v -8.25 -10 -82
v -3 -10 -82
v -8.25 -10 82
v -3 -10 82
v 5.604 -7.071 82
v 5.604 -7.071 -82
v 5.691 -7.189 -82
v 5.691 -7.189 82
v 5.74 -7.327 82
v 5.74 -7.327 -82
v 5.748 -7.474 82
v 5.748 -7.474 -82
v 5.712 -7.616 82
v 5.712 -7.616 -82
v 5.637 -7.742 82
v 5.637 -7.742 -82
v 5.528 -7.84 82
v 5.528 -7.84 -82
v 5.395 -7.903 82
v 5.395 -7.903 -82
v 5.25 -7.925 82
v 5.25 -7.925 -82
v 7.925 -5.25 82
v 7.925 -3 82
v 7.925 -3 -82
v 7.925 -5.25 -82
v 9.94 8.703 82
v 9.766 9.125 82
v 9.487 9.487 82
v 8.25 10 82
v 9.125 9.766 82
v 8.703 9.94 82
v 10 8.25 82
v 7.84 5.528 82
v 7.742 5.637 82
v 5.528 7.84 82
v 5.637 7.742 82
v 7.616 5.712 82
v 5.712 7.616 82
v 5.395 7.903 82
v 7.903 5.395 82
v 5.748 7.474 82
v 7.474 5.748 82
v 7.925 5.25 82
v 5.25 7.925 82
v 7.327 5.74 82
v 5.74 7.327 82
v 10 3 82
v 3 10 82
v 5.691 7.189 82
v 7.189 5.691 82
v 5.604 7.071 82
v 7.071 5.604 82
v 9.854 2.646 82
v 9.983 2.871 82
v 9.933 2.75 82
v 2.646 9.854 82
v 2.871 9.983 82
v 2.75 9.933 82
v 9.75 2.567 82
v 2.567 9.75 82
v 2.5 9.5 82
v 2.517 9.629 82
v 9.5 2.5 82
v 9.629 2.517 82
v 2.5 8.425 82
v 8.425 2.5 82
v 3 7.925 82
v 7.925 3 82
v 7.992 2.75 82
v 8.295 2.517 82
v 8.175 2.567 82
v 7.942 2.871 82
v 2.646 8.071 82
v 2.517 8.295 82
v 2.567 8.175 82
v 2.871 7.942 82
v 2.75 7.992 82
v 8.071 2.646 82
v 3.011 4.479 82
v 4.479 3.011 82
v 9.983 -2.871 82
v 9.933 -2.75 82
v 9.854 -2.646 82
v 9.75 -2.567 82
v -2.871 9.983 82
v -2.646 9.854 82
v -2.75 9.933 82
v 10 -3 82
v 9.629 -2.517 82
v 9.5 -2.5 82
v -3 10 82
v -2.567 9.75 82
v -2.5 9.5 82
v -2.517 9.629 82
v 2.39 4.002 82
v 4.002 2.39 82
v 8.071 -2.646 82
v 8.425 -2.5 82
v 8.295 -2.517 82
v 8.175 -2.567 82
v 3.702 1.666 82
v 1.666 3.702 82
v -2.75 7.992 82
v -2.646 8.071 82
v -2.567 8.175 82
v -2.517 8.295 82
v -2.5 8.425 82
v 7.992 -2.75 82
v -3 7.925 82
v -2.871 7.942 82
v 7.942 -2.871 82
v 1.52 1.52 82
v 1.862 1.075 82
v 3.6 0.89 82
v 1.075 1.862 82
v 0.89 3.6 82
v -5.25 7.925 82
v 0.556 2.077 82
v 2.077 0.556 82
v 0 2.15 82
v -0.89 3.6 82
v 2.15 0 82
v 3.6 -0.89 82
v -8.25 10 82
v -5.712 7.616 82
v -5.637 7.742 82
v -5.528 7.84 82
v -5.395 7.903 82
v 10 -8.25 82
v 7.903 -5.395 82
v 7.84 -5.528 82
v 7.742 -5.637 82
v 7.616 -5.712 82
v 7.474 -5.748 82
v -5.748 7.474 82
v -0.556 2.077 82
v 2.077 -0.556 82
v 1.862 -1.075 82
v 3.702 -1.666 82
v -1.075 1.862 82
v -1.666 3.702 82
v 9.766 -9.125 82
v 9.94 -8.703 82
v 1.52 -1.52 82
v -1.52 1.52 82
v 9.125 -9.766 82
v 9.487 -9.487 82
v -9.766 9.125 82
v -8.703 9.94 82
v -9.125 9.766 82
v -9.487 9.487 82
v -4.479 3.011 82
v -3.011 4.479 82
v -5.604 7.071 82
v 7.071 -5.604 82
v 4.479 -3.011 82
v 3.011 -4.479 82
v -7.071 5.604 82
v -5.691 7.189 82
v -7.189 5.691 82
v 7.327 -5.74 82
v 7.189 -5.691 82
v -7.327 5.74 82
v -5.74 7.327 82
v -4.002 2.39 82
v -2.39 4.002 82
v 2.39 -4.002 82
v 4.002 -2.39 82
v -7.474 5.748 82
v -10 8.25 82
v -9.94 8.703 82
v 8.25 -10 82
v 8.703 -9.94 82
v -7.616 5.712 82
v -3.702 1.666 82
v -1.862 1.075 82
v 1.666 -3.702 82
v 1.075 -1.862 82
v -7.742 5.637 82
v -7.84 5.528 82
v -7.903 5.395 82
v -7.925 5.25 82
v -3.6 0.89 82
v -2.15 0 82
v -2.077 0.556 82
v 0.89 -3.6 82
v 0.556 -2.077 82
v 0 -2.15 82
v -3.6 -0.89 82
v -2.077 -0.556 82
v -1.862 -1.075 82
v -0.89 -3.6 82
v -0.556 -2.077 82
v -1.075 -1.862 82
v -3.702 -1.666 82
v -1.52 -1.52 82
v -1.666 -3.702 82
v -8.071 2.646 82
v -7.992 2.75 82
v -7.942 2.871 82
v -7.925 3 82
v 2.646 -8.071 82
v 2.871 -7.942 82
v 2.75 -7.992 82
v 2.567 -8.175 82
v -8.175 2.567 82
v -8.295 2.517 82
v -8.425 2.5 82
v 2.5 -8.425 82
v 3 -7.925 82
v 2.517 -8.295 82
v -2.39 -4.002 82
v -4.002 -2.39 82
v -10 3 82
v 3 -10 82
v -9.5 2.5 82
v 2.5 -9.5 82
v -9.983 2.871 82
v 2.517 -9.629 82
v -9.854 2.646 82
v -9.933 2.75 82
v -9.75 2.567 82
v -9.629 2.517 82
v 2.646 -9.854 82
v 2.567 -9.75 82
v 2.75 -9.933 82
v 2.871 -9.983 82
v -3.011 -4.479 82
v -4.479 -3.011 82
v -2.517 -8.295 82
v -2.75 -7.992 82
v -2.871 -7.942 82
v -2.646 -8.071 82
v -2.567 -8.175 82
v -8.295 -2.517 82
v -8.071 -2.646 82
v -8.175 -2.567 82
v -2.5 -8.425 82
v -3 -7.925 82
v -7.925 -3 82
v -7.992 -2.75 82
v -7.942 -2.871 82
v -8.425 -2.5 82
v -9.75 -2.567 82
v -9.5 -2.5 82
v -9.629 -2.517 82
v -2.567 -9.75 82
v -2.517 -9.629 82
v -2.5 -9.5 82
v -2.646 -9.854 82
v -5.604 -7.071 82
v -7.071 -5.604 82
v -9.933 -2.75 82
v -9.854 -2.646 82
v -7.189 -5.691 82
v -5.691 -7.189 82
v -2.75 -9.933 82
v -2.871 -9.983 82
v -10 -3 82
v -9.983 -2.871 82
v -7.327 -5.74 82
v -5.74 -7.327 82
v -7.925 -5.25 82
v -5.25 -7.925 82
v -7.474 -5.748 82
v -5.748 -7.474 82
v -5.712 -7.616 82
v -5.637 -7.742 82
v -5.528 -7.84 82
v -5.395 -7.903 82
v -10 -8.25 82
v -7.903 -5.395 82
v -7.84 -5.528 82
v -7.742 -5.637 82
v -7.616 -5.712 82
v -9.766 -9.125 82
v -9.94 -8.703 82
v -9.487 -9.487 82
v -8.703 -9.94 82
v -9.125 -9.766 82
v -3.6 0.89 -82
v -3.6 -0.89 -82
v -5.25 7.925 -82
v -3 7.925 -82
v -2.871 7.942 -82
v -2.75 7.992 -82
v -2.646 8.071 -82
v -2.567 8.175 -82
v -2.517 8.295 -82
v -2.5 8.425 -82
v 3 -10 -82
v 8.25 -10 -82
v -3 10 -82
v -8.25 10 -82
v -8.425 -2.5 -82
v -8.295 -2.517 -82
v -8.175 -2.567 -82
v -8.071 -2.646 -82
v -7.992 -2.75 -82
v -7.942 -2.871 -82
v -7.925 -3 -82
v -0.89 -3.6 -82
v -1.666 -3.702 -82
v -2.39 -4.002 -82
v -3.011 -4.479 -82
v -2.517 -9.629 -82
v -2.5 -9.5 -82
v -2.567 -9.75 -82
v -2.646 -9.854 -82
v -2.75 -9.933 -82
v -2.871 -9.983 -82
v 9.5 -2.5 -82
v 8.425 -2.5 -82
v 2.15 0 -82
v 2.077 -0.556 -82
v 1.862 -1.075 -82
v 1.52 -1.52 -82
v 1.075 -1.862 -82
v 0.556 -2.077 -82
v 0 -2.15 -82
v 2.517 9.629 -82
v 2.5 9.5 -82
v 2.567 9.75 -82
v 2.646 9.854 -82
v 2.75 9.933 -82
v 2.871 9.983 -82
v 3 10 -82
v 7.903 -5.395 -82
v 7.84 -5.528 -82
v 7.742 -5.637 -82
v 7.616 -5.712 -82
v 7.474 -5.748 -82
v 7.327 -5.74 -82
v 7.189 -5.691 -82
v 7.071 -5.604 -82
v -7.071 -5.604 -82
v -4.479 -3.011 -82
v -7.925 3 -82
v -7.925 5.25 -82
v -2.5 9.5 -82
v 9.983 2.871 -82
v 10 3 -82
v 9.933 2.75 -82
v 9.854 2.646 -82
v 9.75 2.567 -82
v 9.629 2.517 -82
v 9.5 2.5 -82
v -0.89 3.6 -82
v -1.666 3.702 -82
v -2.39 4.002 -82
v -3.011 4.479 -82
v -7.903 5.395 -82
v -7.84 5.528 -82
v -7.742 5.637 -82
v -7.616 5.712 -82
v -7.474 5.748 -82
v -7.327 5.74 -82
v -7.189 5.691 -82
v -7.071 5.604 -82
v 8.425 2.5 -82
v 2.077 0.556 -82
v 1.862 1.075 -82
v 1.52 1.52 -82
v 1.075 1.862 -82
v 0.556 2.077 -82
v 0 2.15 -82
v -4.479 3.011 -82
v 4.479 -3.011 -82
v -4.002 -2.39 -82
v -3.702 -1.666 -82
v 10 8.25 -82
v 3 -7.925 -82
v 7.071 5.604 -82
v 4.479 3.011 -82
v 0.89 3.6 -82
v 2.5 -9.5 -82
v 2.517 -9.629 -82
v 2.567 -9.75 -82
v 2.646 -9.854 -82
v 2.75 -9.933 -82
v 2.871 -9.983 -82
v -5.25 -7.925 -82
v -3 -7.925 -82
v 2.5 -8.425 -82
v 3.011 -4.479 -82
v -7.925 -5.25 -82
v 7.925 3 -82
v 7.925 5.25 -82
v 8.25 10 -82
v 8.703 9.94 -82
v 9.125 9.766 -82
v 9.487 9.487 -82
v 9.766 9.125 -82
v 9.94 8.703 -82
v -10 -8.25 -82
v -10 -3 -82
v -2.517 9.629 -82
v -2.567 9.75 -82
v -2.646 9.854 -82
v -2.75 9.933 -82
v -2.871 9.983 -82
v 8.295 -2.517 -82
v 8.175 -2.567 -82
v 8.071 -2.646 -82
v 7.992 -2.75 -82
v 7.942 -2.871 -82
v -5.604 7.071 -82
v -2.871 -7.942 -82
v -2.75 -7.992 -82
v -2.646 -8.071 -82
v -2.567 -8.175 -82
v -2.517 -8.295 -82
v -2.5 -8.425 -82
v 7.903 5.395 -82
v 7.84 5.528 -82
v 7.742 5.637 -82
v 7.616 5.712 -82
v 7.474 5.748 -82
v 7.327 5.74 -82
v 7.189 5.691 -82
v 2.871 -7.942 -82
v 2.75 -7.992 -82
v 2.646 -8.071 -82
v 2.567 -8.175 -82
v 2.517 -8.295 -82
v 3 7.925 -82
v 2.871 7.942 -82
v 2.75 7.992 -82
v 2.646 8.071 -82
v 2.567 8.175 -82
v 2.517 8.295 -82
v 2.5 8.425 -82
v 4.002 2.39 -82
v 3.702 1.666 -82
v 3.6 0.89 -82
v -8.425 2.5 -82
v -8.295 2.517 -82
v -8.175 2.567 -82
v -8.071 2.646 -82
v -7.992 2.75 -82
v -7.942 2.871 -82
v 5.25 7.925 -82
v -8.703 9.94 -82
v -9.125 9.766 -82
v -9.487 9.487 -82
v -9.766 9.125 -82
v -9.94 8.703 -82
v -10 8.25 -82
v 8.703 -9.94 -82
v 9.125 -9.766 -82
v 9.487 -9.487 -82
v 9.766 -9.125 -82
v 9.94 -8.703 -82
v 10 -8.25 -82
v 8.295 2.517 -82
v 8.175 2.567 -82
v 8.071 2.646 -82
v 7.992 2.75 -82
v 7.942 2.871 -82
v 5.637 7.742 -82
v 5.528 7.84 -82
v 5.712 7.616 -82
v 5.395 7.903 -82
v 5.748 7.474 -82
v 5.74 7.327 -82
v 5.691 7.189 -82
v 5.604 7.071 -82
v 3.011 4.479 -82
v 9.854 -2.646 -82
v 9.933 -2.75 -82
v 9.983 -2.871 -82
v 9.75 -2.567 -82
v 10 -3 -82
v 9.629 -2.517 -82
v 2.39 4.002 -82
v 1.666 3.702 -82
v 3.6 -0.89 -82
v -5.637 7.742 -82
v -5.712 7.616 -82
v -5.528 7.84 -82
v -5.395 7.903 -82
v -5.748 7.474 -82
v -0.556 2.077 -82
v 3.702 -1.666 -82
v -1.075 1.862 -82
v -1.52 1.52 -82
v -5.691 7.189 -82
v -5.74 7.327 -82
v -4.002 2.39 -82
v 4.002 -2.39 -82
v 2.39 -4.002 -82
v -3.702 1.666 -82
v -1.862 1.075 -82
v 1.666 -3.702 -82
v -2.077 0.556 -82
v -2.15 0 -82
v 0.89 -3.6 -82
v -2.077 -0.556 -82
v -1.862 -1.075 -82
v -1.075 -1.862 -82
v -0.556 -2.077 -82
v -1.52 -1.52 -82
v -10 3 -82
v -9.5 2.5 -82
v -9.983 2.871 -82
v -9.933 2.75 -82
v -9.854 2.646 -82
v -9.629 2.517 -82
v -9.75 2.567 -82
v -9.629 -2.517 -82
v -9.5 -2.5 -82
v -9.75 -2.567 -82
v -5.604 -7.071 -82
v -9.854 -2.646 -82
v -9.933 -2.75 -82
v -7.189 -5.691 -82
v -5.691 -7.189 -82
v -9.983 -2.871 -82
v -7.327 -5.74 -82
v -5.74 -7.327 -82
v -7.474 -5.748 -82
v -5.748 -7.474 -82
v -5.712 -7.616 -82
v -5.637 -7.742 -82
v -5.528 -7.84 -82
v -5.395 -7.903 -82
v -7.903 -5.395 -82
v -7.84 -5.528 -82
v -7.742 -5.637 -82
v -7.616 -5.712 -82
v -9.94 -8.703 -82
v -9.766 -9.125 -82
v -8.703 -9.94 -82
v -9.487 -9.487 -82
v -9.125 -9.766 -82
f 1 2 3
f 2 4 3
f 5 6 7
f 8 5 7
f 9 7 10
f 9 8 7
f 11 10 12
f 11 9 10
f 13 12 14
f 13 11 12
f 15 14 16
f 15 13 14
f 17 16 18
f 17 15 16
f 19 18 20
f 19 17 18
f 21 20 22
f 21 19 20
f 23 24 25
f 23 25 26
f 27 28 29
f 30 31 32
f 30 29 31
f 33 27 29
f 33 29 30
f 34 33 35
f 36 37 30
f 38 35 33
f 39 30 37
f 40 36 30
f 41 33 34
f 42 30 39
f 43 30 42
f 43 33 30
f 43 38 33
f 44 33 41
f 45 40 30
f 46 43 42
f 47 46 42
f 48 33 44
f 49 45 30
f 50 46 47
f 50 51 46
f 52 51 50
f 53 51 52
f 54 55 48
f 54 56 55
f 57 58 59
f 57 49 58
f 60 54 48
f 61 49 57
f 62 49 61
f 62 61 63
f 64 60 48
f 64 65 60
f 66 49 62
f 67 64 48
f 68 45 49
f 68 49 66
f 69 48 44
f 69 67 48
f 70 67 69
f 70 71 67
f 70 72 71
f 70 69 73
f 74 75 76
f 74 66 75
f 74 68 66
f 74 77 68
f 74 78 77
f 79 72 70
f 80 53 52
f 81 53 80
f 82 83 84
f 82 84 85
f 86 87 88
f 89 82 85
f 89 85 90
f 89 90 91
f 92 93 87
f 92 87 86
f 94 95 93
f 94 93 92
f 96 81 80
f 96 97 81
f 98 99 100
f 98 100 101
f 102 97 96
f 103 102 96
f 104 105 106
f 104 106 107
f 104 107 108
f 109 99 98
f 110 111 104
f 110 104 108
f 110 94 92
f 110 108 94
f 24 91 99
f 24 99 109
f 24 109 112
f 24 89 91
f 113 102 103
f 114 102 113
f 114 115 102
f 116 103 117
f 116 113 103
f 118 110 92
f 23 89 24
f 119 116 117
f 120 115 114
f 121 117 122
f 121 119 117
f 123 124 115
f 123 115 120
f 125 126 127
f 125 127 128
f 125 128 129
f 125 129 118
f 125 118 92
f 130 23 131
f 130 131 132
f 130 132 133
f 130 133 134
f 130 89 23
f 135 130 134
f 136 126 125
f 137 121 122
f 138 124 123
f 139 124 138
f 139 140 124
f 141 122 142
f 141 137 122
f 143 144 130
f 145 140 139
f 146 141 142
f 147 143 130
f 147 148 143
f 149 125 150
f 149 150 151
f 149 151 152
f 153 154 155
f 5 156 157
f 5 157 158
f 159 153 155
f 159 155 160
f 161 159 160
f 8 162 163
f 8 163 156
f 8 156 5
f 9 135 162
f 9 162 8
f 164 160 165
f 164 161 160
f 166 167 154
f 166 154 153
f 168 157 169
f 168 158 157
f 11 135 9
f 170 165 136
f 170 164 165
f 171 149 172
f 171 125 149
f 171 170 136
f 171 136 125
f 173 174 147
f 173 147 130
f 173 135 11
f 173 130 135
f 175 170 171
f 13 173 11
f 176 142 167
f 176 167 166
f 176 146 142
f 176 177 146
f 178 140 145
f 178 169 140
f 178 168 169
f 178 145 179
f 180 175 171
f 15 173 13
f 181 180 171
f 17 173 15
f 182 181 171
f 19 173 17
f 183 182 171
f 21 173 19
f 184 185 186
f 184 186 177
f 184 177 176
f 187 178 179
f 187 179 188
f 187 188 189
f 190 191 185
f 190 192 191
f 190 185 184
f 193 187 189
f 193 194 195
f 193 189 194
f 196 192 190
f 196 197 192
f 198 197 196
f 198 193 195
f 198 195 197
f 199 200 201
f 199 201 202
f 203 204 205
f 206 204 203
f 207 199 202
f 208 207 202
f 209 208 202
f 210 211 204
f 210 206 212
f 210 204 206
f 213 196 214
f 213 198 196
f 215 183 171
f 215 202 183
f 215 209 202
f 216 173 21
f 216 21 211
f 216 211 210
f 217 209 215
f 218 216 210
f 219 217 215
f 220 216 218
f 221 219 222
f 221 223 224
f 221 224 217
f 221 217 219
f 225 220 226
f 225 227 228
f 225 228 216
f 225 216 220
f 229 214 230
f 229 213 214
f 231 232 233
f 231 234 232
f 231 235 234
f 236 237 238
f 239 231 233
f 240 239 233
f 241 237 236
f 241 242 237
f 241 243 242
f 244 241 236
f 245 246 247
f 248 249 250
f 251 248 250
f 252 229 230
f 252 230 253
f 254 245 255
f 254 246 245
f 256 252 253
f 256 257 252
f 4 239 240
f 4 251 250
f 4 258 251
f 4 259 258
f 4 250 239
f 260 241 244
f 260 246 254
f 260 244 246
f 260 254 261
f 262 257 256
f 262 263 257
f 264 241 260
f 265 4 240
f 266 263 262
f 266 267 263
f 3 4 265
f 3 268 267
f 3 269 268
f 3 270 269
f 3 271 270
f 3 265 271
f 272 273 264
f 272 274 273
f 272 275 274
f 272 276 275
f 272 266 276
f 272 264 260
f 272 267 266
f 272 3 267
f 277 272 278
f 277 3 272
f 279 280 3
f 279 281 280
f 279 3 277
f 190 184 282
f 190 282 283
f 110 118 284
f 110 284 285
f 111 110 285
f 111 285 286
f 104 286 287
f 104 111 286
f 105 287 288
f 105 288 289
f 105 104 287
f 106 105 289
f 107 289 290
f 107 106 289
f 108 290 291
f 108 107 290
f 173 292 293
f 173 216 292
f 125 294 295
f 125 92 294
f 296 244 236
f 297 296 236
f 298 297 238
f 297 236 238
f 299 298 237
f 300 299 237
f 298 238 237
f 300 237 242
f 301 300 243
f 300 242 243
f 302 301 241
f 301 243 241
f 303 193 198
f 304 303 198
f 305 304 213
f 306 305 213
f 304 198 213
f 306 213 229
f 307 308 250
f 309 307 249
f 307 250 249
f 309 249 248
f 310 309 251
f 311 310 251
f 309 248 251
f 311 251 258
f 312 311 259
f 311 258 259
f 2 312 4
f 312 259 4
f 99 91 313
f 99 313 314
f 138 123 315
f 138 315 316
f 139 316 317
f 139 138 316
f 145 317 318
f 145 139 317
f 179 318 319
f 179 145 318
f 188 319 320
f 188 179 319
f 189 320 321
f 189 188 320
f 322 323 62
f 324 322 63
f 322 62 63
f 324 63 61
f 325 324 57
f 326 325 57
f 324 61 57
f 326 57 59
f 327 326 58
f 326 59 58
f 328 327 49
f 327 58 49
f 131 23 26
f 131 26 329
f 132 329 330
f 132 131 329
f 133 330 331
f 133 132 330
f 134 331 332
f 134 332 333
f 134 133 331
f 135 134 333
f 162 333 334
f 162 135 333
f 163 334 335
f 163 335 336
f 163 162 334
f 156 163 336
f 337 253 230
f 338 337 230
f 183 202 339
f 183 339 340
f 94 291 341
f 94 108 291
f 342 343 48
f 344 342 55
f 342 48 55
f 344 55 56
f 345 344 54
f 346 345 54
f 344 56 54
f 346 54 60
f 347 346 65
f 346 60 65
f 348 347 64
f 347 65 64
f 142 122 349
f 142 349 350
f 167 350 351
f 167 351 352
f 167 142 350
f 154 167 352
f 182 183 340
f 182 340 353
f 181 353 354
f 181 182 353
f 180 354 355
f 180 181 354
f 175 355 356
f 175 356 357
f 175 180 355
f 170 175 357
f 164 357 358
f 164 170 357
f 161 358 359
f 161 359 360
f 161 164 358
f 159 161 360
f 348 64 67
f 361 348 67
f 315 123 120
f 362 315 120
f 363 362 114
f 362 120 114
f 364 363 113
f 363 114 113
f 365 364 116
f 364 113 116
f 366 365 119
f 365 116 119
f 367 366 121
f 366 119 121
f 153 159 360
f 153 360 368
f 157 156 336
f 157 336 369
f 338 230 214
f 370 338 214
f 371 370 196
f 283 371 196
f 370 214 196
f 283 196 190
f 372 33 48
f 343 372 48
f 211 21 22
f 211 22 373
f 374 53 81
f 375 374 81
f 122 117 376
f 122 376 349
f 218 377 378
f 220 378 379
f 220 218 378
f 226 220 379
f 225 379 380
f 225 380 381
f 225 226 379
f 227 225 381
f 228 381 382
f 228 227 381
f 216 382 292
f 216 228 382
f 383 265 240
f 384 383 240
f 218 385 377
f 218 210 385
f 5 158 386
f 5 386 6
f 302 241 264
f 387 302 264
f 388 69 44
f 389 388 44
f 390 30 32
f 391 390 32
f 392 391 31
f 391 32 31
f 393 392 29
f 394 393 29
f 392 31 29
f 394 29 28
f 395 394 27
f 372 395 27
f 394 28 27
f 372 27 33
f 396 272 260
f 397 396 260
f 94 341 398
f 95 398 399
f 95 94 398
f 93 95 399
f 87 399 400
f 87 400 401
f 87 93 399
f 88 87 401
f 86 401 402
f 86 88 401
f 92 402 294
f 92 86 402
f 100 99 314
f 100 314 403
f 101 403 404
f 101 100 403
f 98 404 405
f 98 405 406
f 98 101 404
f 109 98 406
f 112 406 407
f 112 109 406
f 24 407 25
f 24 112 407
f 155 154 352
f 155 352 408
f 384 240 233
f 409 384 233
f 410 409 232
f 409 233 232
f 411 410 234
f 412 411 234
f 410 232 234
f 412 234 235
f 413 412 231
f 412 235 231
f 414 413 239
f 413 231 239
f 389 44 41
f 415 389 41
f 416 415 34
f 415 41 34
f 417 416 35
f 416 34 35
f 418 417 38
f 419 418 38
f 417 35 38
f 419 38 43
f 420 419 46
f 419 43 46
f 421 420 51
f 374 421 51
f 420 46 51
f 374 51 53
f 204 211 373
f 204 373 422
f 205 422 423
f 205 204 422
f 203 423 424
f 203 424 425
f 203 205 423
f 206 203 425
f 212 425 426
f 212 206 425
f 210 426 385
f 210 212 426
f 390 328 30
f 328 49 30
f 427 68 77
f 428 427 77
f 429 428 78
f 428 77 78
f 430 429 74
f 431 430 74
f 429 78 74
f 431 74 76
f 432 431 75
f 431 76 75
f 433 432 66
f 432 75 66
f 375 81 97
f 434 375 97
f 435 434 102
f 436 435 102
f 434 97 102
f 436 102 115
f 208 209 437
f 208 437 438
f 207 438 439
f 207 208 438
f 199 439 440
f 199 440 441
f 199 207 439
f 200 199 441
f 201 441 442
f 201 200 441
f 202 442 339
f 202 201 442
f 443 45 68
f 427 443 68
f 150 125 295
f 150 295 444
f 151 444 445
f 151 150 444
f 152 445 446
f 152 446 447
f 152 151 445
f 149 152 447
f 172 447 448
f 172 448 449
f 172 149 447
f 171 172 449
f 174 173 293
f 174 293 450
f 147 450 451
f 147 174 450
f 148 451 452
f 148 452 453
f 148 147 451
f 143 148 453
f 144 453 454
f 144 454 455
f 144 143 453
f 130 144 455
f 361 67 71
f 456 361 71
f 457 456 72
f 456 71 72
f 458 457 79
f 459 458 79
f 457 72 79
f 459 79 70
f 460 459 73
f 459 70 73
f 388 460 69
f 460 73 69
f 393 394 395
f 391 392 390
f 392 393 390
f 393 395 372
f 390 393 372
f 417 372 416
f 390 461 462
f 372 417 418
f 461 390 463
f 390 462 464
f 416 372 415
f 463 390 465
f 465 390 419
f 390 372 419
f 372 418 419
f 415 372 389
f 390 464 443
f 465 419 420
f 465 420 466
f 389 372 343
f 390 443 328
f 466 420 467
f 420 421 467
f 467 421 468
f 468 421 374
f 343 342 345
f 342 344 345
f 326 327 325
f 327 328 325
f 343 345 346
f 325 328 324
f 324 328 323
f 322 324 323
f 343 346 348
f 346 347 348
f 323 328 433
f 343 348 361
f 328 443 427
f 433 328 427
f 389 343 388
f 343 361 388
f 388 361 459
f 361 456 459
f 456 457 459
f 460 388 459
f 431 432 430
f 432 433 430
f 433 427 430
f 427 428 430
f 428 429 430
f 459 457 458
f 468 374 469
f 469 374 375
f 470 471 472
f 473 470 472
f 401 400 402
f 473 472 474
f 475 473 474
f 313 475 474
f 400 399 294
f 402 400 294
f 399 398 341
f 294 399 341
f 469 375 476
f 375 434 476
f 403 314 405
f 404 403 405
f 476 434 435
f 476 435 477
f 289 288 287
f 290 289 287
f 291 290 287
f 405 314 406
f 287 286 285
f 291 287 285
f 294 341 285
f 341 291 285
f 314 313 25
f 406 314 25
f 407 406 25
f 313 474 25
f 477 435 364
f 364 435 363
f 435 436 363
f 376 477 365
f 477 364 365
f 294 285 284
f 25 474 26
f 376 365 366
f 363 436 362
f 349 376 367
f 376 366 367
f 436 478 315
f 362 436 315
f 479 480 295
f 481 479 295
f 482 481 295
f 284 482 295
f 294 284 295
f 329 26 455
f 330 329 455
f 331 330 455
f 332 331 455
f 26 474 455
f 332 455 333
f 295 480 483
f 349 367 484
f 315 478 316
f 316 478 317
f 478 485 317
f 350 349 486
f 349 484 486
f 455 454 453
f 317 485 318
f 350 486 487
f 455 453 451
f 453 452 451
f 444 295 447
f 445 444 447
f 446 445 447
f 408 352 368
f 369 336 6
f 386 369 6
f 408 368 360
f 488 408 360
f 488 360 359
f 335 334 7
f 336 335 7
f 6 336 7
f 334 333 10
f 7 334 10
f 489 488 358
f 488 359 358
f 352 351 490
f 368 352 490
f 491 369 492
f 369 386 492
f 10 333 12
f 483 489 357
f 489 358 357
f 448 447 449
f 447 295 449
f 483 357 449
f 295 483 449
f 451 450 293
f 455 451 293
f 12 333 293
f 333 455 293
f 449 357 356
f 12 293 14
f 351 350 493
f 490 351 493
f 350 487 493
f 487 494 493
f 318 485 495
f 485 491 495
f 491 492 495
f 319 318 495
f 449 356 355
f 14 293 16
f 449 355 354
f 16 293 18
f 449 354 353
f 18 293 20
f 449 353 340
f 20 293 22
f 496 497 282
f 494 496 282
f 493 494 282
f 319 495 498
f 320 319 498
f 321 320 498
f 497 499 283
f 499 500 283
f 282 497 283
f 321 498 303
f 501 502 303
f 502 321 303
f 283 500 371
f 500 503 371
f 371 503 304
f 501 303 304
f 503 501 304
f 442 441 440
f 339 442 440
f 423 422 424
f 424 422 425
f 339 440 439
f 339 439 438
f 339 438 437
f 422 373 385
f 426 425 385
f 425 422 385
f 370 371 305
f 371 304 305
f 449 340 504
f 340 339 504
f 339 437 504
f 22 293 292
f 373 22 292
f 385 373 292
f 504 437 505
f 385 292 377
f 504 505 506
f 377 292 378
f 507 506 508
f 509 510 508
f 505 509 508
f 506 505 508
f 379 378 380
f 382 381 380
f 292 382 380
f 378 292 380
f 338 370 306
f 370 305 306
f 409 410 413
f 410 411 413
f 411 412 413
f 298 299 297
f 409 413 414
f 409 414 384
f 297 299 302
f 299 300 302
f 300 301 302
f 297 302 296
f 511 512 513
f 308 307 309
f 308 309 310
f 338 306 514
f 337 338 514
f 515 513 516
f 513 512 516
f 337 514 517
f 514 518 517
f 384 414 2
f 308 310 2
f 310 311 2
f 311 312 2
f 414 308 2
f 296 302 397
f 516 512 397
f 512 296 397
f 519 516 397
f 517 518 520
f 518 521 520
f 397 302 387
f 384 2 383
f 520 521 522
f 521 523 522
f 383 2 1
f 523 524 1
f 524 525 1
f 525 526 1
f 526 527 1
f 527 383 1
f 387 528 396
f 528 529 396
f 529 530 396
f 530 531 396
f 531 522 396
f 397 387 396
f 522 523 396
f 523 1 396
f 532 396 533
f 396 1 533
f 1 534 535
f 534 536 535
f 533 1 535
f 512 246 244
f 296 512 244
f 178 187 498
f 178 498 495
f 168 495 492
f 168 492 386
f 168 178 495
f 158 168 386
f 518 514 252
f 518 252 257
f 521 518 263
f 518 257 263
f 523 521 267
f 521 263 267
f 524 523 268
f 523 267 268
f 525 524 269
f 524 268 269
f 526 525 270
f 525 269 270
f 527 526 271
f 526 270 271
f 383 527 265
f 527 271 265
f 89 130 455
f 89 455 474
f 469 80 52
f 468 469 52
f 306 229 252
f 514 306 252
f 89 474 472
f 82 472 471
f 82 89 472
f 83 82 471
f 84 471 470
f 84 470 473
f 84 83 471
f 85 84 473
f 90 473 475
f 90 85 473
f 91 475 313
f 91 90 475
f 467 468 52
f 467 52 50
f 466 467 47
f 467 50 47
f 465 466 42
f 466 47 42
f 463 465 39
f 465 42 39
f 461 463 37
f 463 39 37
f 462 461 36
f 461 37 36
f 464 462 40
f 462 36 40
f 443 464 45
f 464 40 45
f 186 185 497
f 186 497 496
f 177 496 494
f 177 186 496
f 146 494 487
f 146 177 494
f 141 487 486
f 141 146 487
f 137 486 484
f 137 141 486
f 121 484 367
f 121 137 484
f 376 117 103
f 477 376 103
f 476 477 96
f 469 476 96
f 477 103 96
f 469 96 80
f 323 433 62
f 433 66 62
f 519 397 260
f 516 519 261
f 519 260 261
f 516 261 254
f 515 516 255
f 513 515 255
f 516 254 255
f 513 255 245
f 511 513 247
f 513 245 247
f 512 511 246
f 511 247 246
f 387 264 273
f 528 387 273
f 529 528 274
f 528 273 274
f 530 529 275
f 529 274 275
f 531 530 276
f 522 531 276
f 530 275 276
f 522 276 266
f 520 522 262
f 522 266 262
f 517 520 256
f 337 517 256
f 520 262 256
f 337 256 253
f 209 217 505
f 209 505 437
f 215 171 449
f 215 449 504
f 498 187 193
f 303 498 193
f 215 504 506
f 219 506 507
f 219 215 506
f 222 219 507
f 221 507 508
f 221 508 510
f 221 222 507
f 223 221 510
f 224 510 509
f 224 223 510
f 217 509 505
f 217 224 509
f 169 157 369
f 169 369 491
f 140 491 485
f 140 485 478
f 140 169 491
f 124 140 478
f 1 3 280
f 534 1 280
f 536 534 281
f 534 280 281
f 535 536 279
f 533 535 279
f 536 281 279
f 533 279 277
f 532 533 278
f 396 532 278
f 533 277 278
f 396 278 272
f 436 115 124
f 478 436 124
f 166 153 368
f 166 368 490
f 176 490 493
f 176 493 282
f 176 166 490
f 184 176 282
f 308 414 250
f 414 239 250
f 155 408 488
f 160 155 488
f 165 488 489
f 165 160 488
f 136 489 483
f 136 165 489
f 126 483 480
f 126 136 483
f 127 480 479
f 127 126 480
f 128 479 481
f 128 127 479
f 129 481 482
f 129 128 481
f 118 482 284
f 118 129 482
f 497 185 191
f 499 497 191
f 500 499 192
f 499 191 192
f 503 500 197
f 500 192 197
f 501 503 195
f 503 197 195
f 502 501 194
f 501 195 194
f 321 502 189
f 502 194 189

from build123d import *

# Parameters (mm, degrees)
BOSS_EXTRUDE1_DEPTH = 82


with BuildPart() as part:
    # Sketch4 → Boss-Extrude1 (new body, symmetric)
    with BuildSketch(Plane.XY):
        with BuildLine():
            Line((3, -10), (8.25, -10))
            ThreePointArc((8.25, -10), (9.487436867, -9.487436867), (10, -8.25))
            Line((10, -8.25), (10, -3))
            ThreePointArc((10, -3), (9.853553391, -2.646446609), (9.5, -2.5))
            Line((9.5, -2.5), (8.424621202, -2.5))
            ThreePointArc((8.424621202, -2.5), (8.071067812, -2.646446609), (7.924621202, -3))
            Line((7.924621202, -3), (7.924621202, -5.25))
            ThreePointArc((7.924621202, -5.25), (7.615962919, -5.711939766), (7.071067812, -5.603553391))
            Line((7.071067812, -5.603553391), (4.478679656, -3.011165235))
            ThreePointArc((4.478679656, -3.011165235), (3.828361402, -2.037895189), (3.6, -0.889844892))
            Line((3.6, -0.889844892), (3.6, 0))
            Line((3.6, 0), (2.15, 0))
            ThreePointArc((2.15, 0), (1.52027958, -1.52027958), (0, -2.15))
            Line((0, -2.15), (0, -3.6))
            Line((0, -3.6), (0.889844892, -3.6))
            ThreePointArc((0.889844892, -3.6), (2.037895189, -3.828361402), (3.011165235, -4.478679656))
            Line((3.011165235, -4.478679656), (5.603553391, -7.071067812))
            ThreePointArc((5.603553391, -7.071067812), (5.711939766, -7.615962919), (5.25, -7.924621202))
            Line((5.25, -7.924621202), (3, -7.924621202))
            ThreePointArc((3, -7.924621202), (2.646446609, -8.071067812), (2.5, -8.424621202))
            Line((2.5, -8.424621202), (2.5, -9.5))
            ThreePointArc((2.5, -9.5), (2.646446609, -9.853553391), (3, -10))
        make_face()
    extrude(amount=BOSS_EXTRUDE1_DEPTH, both=True)

    # Mirror1: part across plane


with BuildPart() as part_1:
    add(part.part)
    add(part.part.mirror(Plane(origin=(0, 0, 0), x_dir=(0, 0, 1), z_dir=(1, 0, 0))))

    # Mirror2: part across plane


with BuildPart() as part_2:
    add(part_1.part)
    add(part_1.part.mirror(Plane.ZX))


solid = part_2.part
